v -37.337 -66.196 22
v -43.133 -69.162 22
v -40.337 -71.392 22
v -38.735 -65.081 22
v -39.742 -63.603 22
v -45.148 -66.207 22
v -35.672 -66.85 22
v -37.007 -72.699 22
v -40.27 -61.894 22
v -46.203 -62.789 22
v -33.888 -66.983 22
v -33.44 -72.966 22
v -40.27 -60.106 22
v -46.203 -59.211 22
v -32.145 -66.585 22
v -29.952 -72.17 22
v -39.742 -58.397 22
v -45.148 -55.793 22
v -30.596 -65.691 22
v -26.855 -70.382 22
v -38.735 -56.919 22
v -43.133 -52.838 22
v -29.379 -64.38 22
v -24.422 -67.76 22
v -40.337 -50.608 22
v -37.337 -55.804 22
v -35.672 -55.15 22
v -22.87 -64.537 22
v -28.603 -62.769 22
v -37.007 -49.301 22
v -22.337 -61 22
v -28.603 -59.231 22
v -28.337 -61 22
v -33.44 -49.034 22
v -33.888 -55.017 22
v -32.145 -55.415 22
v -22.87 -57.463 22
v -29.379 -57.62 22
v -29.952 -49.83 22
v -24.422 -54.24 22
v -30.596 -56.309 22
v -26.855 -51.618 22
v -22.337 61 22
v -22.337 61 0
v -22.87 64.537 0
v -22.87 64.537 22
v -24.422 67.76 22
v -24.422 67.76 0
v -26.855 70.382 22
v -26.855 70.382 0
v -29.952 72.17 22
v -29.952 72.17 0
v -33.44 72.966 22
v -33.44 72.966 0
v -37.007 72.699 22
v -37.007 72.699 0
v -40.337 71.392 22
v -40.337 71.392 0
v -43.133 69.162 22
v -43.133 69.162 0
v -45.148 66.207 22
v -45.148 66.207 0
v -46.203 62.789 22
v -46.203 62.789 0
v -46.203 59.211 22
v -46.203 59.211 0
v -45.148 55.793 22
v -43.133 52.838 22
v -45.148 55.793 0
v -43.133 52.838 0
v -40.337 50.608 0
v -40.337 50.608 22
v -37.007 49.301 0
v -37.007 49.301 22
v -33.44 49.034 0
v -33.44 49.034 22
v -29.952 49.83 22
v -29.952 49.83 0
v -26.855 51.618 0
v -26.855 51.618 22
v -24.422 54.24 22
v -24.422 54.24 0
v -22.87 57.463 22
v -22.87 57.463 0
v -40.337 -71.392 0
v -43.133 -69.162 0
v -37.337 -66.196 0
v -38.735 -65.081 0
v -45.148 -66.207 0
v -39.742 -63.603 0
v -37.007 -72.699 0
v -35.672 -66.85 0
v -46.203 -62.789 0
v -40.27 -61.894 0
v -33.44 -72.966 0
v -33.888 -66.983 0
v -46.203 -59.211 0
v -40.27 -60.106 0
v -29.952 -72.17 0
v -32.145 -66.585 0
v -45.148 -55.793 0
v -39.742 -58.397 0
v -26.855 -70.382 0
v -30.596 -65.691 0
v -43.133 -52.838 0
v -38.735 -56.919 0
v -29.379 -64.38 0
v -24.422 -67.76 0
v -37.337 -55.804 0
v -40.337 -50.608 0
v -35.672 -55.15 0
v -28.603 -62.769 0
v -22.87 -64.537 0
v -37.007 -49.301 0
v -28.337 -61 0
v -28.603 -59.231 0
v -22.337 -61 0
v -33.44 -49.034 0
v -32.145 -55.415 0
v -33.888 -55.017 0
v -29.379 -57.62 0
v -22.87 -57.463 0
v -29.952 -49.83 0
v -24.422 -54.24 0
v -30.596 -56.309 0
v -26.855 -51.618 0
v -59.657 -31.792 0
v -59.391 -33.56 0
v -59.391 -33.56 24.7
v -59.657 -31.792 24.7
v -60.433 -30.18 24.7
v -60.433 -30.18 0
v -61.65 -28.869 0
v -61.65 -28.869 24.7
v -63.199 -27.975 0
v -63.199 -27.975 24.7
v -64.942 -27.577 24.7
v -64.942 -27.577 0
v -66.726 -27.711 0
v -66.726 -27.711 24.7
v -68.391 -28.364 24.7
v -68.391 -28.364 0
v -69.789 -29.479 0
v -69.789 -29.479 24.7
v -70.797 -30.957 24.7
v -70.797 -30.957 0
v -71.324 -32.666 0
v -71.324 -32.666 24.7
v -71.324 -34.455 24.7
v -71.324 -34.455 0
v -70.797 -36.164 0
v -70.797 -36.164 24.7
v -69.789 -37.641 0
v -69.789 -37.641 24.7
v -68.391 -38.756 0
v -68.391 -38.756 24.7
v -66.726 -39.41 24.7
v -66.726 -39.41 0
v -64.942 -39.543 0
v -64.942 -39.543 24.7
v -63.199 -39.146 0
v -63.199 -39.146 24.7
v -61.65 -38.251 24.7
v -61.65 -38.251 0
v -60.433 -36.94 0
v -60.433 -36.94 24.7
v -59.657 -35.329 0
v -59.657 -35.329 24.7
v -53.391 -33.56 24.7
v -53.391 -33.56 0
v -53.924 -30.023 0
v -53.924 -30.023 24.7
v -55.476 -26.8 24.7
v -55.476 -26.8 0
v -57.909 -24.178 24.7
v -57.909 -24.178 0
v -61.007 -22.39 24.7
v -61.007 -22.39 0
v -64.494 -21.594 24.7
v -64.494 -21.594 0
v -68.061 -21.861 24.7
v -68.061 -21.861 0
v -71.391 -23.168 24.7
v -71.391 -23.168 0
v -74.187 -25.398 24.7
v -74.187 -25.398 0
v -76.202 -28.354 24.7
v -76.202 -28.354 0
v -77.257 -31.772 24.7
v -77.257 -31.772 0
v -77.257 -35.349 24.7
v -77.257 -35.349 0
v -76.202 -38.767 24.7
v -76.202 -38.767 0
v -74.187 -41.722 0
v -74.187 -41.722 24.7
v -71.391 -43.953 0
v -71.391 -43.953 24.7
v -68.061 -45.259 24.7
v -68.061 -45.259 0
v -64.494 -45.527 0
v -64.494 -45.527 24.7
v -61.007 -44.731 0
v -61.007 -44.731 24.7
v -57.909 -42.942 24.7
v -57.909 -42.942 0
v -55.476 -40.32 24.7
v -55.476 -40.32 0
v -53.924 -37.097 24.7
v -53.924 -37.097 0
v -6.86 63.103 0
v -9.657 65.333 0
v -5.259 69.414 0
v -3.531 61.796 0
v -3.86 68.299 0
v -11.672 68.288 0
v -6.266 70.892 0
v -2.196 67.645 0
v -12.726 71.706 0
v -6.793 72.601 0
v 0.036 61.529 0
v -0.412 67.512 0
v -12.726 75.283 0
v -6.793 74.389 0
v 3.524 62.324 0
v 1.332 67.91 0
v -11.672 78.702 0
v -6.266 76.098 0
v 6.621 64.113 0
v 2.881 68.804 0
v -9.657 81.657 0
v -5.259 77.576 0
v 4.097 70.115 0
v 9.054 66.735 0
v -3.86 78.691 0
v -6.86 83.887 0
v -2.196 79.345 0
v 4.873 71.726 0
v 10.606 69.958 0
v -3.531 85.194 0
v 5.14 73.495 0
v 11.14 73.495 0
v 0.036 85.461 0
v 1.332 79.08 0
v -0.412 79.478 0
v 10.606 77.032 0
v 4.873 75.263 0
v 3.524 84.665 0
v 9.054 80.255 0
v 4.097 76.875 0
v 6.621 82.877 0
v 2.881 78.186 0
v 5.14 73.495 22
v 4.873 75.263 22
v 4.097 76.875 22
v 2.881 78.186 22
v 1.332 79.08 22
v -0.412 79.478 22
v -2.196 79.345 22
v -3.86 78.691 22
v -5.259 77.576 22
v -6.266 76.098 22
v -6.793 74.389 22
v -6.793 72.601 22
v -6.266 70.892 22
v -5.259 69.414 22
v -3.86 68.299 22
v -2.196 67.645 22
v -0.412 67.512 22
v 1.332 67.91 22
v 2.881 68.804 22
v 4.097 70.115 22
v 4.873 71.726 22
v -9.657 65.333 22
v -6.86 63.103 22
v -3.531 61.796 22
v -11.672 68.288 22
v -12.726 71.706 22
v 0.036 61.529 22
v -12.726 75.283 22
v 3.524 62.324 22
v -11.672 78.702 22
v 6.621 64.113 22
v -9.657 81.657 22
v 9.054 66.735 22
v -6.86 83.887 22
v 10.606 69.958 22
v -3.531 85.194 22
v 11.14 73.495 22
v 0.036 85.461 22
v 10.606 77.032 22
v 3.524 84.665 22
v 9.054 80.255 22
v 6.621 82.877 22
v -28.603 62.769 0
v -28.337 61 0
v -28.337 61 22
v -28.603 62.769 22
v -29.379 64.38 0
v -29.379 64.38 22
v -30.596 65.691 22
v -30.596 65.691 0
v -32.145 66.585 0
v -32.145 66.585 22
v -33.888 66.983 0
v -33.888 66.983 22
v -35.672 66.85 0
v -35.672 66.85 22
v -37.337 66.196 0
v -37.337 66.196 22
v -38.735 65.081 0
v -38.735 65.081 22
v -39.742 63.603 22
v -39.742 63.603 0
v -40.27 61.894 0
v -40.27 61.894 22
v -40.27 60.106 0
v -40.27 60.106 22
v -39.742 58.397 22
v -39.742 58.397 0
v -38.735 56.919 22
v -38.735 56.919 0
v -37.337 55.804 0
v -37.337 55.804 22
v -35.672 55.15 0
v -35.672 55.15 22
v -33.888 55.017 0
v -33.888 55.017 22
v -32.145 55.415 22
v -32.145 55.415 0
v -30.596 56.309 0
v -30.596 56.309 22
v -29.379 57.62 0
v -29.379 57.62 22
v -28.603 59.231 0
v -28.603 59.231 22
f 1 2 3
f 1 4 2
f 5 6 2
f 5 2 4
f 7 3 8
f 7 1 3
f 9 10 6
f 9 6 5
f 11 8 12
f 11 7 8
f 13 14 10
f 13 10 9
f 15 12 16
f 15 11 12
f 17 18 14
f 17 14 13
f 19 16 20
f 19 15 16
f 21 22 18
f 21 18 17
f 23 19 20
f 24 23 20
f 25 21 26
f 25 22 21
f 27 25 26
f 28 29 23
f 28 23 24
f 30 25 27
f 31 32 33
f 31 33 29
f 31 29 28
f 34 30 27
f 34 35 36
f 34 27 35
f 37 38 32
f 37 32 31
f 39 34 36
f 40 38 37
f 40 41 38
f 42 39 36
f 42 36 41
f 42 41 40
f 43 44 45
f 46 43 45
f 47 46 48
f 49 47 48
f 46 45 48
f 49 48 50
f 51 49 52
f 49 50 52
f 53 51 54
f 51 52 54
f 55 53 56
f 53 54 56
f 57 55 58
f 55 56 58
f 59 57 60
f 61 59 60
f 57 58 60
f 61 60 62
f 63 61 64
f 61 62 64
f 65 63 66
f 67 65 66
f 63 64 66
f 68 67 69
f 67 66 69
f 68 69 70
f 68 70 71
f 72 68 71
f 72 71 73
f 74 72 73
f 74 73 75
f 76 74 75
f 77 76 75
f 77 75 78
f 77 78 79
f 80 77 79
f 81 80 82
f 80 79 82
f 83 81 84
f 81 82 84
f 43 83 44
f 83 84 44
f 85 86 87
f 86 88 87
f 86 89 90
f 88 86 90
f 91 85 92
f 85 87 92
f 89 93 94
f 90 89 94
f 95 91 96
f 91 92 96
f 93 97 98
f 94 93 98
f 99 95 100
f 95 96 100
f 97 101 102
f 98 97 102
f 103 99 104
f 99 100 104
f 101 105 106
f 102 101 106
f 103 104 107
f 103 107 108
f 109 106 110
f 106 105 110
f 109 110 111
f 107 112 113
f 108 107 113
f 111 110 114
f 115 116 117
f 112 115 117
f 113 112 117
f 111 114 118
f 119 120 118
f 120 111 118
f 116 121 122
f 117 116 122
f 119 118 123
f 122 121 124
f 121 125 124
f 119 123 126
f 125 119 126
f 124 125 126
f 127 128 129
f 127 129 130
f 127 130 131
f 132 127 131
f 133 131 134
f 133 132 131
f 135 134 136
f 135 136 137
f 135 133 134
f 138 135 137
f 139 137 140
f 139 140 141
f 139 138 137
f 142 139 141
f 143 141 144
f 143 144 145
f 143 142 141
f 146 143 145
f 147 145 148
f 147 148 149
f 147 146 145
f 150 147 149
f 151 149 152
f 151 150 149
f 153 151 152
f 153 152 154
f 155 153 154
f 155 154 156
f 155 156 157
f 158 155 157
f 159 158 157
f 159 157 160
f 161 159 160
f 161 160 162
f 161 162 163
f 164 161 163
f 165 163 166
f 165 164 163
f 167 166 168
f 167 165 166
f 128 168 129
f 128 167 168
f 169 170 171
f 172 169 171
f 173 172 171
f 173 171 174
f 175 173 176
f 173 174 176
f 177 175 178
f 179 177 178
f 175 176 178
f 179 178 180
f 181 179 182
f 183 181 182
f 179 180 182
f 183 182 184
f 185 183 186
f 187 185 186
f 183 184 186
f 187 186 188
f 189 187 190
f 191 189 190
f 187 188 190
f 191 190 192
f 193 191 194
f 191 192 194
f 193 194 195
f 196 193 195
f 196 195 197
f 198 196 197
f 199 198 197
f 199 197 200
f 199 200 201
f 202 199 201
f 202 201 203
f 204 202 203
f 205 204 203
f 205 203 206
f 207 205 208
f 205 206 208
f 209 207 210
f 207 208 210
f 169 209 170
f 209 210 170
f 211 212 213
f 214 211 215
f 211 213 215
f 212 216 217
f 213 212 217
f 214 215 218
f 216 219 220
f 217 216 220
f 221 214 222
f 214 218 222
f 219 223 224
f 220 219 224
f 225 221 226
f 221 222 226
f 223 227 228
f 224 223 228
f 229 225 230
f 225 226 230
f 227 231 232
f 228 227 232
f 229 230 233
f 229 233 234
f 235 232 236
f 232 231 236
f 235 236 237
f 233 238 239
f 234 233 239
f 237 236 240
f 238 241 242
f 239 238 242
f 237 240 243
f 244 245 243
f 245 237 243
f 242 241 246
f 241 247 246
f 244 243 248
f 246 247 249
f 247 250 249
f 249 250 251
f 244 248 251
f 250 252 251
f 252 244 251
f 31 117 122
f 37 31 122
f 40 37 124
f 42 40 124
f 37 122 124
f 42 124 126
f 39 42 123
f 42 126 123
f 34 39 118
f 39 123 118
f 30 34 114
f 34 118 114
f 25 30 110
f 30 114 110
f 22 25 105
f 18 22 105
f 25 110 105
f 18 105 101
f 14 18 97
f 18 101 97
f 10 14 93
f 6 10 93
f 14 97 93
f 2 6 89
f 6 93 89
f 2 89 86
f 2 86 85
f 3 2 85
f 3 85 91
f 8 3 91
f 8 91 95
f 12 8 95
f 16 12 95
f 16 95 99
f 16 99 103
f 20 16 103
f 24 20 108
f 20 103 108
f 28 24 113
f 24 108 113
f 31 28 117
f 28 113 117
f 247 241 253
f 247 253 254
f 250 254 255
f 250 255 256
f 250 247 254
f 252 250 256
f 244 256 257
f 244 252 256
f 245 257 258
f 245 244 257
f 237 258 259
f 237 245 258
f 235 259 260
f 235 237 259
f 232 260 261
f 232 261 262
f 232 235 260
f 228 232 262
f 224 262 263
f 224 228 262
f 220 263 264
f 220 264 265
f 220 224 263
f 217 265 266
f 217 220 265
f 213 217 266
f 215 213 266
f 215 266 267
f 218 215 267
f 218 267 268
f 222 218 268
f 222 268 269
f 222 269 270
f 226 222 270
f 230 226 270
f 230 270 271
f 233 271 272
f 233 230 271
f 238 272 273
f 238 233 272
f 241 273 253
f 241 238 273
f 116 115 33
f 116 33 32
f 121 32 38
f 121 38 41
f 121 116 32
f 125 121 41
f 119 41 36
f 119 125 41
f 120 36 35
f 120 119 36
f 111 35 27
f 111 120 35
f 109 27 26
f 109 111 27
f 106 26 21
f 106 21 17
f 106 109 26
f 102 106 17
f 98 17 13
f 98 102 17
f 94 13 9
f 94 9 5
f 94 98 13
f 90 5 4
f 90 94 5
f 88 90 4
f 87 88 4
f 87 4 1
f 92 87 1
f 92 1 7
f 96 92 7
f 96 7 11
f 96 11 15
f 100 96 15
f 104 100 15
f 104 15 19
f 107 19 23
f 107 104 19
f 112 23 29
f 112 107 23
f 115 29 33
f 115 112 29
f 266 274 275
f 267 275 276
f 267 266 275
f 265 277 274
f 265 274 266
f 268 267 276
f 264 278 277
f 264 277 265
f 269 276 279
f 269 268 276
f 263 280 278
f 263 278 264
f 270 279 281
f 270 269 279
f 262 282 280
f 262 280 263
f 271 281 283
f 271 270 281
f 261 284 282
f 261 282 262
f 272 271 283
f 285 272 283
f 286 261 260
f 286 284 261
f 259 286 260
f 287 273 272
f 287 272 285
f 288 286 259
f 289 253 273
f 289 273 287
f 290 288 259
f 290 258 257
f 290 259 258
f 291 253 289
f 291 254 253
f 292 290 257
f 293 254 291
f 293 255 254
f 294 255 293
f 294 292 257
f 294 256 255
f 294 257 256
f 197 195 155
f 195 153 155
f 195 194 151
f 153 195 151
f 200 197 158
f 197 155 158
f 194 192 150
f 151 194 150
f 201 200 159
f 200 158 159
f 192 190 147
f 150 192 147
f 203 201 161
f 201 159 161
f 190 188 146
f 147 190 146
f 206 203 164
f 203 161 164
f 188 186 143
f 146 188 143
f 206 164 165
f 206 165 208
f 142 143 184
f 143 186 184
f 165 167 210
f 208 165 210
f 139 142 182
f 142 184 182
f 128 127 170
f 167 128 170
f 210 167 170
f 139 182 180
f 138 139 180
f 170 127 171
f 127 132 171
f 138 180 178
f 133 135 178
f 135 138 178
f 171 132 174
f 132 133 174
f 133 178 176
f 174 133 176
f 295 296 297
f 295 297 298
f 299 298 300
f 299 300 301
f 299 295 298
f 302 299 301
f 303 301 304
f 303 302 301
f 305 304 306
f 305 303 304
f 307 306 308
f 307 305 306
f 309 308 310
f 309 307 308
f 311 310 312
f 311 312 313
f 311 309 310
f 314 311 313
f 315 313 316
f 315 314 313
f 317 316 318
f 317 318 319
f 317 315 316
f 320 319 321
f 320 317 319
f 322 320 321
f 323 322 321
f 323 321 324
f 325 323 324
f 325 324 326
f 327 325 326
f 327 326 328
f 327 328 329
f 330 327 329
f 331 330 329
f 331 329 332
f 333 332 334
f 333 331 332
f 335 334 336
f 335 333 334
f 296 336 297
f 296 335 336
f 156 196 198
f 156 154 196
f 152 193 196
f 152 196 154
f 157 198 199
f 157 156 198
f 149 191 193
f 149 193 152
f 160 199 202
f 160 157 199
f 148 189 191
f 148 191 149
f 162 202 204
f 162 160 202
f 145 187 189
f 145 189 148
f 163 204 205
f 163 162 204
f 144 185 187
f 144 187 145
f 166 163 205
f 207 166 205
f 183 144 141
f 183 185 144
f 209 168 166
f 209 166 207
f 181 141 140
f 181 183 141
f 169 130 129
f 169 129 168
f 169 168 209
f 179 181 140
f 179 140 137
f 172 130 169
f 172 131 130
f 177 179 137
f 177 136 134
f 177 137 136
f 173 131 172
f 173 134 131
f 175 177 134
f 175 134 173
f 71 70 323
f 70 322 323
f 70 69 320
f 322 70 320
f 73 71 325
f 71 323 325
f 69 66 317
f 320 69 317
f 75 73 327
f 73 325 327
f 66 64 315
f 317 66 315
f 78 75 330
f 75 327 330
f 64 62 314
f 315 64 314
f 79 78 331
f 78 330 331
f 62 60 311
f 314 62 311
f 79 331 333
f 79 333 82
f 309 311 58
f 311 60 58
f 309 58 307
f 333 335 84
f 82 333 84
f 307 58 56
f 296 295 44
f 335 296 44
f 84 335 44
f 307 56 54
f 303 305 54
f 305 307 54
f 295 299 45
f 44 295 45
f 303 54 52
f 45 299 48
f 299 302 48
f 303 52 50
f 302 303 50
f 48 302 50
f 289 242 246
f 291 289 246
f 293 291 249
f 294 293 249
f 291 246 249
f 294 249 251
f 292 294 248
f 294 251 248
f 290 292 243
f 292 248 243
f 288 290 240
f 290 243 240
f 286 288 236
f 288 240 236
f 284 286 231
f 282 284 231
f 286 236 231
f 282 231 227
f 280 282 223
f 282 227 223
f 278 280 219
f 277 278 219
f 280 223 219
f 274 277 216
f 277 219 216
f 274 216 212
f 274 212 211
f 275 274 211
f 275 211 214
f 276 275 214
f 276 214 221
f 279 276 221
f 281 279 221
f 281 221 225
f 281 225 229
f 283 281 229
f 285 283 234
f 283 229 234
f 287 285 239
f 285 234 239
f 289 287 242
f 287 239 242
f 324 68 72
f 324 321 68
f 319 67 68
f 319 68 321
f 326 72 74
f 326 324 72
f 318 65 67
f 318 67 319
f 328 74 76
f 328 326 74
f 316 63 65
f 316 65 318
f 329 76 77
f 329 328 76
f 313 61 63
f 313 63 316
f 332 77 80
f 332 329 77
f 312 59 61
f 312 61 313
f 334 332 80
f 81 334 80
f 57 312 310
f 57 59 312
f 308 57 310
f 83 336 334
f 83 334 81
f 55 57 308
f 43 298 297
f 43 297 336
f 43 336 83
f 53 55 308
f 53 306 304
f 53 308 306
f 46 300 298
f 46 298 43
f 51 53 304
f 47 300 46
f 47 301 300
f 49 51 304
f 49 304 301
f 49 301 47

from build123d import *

# Parameters (mm, degrees)
F0_R     = 12
F0_R_2   = 6
F1_DEPTH = 22
F2_DEPTH = 24.7


# Not quite as in the source:
# - a feature names something its author has since deleted; it is built from what else it names


with BuildPart() as f1:
    # F0 (on Top) → F1 (new body)
    with BuildSketch(Plane.XY):
        with Locations((-34.3365694268, 61)):
            Circle(F0_R)
        with Locations((-34.3365694268, 61)):
            Circle(F0_R_2, mode=Mode.SUBTRACT)
    extrude(amount=F1_DEPTH)


with BuildPart() as f1b:
    # F0 (on Top) → F1, piece 2 (new body)
    with BuildSketch(Plane.XY):
        with Locations((-34.3365694268, -61)):
            Circle(F0_R)
        with Locations((-34.3365694268, -61)):
            Circle(F0_R_2, mode=Mode.SUBTRACT)
    extrude(amount=F1_DEPTH)


with BuildPart() as f1c:
    # F0 (on Top) → F1, piece 3 (new body)
    with BuildSketch(Plane.XY):
        with Locations((-0.860383961, 73.4949640414)):
            Circle(F0_R)
        with Locations((-0.860383961, 73.4949640414)):
            Circle(F0_R_2, mode=Mode.SUBTRACT)
    extrude(amount=F1_DEPTH)


with BuildPart() as f2:
    # F0 (on Top) → F2 (new body)
    with BuildSketch(Plane.XY):
        with Locations((-65.3908093134, -33.5602749889)):
            Circle(F0_R)
        with Locations((-65.3908093134, -33.5602749889)):
            Circle(F0_R_2, mode=Mode.SUBTRACT)
    extrude(amount=F2_DEPTH)


solid = Compound([f1.part, f1b.part, f1c.part, f2.part])
